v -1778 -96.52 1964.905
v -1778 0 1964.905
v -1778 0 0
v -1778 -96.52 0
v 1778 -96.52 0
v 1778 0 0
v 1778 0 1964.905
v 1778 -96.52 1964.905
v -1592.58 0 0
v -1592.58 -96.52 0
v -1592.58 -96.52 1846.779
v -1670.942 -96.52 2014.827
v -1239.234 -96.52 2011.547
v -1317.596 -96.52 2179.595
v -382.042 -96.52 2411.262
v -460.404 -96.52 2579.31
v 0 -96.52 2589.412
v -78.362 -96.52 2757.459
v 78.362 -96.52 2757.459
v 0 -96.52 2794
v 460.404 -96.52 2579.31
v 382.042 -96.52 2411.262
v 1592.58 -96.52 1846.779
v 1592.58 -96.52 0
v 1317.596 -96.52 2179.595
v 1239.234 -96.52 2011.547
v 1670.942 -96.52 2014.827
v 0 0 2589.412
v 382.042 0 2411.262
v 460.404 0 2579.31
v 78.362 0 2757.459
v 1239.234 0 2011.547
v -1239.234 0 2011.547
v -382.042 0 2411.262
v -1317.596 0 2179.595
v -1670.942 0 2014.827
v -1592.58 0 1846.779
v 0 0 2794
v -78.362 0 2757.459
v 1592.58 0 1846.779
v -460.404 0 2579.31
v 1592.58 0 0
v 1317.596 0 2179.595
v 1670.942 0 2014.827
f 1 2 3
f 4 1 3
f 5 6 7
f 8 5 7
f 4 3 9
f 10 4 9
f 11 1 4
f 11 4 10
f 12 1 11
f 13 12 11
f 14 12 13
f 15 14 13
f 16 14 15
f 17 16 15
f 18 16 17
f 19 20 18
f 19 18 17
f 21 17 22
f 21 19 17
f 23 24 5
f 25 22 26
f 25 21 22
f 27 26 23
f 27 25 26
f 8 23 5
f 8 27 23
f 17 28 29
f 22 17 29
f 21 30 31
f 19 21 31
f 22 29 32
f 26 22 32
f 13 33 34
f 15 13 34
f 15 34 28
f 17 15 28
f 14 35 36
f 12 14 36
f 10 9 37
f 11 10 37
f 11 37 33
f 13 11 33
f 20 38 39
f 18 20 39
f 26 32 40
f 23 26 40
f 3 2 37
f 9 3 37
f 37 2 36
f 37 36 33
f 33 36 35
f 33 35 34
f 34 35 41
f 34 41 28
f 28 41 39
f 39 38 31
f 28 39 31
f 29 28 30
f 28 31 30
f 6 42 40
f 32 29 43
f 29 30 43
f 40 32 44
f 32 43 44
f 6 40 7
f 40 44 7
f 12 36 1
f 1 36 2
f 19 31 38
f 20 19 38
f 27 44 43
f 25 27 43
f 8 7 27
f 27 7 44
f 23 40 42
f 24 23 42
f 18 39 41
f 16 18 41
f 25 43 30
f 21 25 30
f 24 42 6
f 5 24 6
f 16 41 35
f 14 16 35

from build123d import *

# Parameters (mm, degrees)
F0_W     = 185.42
F0_H     = 389.874432
F0_H_2   = 1456.904984
F1_DEPTH = 96.52


with BuildPart() as f1:
    # F0 (on Front) → F1 (new body)
    with BuildSketch(Plane.XZ):
        with Locations((1685.29, 1651.8422)):
            Rectangle(F0_W, F0_H)
        Polygon((1670.941878, 2014.827006), (1592.58, 1846.779416), (1778, 1964.904984), align=None)
        Polygon((460.404356, 2579.309923), (382.042478, 2411.262333), (1239.233766, 2011.547471), (1317.595644, 2179.595061), align=None)
        Polygon((-1778, 1964.904984), (-1592.58, 1846.779416), (-1670.941878, 2014.827006), align=None)
        with Locations((-1685.29, 728.452492)):
            Rectangle(F0_W, F0_H_2)
        Polygon((1317.595644, 2179.595061), (1239.233766, 2011.547471), (1592.58, 1846.779416), (1670.941878, 2014.827006), align=None)
        with Locations((1685.29, 728.452492)):
            Rectangle(F0_W, F0_H_2)
        Polygon((-1670.941878, 2014.827006), (-1592.58, 1846.779416), (-1239.233766, 2011.547471), (-1317.595644, 2179.595061), align=None)
        Polygon((78.361878, 2757.459256), (0, 2589.411666), (382.042478, 2411.262333), (460.404356, 2579.309923), align=None)
        with Locations((-1685.29, 1651.8422)):
            Rectangle(F0_W, F0_H)
        Polygon((-460.404356, 2579.309923), (-382.042478, 2411.262333), (0, 2589.411666), (-78.361878, 2757.459256), align=None)
        Polygon((-78.361878, 2757.459256), (0, 2589.411666), (0, 2794), align=None)
        Polygon((-1778, 1846.779416), (-1592.58, 1846.779416), (-1778, 1964.904984), align=None)
        Polygon((1778, 1964.904984), (1592.58, 1846.779416), (1778, 1846.779416), align=None)
        Polygon((-1317.595644, 2179.595061), (-1239.233766, 2011.547471), (-382.042478, 2411.262333), (-460.404356, 2579.309923), align=None)
        Polygon((0, 2794), (0, 2589.411666), (78.361878, 2757.459256), align=None)
    extrude(amount=F1_DEPTH)


solid = f1.part
